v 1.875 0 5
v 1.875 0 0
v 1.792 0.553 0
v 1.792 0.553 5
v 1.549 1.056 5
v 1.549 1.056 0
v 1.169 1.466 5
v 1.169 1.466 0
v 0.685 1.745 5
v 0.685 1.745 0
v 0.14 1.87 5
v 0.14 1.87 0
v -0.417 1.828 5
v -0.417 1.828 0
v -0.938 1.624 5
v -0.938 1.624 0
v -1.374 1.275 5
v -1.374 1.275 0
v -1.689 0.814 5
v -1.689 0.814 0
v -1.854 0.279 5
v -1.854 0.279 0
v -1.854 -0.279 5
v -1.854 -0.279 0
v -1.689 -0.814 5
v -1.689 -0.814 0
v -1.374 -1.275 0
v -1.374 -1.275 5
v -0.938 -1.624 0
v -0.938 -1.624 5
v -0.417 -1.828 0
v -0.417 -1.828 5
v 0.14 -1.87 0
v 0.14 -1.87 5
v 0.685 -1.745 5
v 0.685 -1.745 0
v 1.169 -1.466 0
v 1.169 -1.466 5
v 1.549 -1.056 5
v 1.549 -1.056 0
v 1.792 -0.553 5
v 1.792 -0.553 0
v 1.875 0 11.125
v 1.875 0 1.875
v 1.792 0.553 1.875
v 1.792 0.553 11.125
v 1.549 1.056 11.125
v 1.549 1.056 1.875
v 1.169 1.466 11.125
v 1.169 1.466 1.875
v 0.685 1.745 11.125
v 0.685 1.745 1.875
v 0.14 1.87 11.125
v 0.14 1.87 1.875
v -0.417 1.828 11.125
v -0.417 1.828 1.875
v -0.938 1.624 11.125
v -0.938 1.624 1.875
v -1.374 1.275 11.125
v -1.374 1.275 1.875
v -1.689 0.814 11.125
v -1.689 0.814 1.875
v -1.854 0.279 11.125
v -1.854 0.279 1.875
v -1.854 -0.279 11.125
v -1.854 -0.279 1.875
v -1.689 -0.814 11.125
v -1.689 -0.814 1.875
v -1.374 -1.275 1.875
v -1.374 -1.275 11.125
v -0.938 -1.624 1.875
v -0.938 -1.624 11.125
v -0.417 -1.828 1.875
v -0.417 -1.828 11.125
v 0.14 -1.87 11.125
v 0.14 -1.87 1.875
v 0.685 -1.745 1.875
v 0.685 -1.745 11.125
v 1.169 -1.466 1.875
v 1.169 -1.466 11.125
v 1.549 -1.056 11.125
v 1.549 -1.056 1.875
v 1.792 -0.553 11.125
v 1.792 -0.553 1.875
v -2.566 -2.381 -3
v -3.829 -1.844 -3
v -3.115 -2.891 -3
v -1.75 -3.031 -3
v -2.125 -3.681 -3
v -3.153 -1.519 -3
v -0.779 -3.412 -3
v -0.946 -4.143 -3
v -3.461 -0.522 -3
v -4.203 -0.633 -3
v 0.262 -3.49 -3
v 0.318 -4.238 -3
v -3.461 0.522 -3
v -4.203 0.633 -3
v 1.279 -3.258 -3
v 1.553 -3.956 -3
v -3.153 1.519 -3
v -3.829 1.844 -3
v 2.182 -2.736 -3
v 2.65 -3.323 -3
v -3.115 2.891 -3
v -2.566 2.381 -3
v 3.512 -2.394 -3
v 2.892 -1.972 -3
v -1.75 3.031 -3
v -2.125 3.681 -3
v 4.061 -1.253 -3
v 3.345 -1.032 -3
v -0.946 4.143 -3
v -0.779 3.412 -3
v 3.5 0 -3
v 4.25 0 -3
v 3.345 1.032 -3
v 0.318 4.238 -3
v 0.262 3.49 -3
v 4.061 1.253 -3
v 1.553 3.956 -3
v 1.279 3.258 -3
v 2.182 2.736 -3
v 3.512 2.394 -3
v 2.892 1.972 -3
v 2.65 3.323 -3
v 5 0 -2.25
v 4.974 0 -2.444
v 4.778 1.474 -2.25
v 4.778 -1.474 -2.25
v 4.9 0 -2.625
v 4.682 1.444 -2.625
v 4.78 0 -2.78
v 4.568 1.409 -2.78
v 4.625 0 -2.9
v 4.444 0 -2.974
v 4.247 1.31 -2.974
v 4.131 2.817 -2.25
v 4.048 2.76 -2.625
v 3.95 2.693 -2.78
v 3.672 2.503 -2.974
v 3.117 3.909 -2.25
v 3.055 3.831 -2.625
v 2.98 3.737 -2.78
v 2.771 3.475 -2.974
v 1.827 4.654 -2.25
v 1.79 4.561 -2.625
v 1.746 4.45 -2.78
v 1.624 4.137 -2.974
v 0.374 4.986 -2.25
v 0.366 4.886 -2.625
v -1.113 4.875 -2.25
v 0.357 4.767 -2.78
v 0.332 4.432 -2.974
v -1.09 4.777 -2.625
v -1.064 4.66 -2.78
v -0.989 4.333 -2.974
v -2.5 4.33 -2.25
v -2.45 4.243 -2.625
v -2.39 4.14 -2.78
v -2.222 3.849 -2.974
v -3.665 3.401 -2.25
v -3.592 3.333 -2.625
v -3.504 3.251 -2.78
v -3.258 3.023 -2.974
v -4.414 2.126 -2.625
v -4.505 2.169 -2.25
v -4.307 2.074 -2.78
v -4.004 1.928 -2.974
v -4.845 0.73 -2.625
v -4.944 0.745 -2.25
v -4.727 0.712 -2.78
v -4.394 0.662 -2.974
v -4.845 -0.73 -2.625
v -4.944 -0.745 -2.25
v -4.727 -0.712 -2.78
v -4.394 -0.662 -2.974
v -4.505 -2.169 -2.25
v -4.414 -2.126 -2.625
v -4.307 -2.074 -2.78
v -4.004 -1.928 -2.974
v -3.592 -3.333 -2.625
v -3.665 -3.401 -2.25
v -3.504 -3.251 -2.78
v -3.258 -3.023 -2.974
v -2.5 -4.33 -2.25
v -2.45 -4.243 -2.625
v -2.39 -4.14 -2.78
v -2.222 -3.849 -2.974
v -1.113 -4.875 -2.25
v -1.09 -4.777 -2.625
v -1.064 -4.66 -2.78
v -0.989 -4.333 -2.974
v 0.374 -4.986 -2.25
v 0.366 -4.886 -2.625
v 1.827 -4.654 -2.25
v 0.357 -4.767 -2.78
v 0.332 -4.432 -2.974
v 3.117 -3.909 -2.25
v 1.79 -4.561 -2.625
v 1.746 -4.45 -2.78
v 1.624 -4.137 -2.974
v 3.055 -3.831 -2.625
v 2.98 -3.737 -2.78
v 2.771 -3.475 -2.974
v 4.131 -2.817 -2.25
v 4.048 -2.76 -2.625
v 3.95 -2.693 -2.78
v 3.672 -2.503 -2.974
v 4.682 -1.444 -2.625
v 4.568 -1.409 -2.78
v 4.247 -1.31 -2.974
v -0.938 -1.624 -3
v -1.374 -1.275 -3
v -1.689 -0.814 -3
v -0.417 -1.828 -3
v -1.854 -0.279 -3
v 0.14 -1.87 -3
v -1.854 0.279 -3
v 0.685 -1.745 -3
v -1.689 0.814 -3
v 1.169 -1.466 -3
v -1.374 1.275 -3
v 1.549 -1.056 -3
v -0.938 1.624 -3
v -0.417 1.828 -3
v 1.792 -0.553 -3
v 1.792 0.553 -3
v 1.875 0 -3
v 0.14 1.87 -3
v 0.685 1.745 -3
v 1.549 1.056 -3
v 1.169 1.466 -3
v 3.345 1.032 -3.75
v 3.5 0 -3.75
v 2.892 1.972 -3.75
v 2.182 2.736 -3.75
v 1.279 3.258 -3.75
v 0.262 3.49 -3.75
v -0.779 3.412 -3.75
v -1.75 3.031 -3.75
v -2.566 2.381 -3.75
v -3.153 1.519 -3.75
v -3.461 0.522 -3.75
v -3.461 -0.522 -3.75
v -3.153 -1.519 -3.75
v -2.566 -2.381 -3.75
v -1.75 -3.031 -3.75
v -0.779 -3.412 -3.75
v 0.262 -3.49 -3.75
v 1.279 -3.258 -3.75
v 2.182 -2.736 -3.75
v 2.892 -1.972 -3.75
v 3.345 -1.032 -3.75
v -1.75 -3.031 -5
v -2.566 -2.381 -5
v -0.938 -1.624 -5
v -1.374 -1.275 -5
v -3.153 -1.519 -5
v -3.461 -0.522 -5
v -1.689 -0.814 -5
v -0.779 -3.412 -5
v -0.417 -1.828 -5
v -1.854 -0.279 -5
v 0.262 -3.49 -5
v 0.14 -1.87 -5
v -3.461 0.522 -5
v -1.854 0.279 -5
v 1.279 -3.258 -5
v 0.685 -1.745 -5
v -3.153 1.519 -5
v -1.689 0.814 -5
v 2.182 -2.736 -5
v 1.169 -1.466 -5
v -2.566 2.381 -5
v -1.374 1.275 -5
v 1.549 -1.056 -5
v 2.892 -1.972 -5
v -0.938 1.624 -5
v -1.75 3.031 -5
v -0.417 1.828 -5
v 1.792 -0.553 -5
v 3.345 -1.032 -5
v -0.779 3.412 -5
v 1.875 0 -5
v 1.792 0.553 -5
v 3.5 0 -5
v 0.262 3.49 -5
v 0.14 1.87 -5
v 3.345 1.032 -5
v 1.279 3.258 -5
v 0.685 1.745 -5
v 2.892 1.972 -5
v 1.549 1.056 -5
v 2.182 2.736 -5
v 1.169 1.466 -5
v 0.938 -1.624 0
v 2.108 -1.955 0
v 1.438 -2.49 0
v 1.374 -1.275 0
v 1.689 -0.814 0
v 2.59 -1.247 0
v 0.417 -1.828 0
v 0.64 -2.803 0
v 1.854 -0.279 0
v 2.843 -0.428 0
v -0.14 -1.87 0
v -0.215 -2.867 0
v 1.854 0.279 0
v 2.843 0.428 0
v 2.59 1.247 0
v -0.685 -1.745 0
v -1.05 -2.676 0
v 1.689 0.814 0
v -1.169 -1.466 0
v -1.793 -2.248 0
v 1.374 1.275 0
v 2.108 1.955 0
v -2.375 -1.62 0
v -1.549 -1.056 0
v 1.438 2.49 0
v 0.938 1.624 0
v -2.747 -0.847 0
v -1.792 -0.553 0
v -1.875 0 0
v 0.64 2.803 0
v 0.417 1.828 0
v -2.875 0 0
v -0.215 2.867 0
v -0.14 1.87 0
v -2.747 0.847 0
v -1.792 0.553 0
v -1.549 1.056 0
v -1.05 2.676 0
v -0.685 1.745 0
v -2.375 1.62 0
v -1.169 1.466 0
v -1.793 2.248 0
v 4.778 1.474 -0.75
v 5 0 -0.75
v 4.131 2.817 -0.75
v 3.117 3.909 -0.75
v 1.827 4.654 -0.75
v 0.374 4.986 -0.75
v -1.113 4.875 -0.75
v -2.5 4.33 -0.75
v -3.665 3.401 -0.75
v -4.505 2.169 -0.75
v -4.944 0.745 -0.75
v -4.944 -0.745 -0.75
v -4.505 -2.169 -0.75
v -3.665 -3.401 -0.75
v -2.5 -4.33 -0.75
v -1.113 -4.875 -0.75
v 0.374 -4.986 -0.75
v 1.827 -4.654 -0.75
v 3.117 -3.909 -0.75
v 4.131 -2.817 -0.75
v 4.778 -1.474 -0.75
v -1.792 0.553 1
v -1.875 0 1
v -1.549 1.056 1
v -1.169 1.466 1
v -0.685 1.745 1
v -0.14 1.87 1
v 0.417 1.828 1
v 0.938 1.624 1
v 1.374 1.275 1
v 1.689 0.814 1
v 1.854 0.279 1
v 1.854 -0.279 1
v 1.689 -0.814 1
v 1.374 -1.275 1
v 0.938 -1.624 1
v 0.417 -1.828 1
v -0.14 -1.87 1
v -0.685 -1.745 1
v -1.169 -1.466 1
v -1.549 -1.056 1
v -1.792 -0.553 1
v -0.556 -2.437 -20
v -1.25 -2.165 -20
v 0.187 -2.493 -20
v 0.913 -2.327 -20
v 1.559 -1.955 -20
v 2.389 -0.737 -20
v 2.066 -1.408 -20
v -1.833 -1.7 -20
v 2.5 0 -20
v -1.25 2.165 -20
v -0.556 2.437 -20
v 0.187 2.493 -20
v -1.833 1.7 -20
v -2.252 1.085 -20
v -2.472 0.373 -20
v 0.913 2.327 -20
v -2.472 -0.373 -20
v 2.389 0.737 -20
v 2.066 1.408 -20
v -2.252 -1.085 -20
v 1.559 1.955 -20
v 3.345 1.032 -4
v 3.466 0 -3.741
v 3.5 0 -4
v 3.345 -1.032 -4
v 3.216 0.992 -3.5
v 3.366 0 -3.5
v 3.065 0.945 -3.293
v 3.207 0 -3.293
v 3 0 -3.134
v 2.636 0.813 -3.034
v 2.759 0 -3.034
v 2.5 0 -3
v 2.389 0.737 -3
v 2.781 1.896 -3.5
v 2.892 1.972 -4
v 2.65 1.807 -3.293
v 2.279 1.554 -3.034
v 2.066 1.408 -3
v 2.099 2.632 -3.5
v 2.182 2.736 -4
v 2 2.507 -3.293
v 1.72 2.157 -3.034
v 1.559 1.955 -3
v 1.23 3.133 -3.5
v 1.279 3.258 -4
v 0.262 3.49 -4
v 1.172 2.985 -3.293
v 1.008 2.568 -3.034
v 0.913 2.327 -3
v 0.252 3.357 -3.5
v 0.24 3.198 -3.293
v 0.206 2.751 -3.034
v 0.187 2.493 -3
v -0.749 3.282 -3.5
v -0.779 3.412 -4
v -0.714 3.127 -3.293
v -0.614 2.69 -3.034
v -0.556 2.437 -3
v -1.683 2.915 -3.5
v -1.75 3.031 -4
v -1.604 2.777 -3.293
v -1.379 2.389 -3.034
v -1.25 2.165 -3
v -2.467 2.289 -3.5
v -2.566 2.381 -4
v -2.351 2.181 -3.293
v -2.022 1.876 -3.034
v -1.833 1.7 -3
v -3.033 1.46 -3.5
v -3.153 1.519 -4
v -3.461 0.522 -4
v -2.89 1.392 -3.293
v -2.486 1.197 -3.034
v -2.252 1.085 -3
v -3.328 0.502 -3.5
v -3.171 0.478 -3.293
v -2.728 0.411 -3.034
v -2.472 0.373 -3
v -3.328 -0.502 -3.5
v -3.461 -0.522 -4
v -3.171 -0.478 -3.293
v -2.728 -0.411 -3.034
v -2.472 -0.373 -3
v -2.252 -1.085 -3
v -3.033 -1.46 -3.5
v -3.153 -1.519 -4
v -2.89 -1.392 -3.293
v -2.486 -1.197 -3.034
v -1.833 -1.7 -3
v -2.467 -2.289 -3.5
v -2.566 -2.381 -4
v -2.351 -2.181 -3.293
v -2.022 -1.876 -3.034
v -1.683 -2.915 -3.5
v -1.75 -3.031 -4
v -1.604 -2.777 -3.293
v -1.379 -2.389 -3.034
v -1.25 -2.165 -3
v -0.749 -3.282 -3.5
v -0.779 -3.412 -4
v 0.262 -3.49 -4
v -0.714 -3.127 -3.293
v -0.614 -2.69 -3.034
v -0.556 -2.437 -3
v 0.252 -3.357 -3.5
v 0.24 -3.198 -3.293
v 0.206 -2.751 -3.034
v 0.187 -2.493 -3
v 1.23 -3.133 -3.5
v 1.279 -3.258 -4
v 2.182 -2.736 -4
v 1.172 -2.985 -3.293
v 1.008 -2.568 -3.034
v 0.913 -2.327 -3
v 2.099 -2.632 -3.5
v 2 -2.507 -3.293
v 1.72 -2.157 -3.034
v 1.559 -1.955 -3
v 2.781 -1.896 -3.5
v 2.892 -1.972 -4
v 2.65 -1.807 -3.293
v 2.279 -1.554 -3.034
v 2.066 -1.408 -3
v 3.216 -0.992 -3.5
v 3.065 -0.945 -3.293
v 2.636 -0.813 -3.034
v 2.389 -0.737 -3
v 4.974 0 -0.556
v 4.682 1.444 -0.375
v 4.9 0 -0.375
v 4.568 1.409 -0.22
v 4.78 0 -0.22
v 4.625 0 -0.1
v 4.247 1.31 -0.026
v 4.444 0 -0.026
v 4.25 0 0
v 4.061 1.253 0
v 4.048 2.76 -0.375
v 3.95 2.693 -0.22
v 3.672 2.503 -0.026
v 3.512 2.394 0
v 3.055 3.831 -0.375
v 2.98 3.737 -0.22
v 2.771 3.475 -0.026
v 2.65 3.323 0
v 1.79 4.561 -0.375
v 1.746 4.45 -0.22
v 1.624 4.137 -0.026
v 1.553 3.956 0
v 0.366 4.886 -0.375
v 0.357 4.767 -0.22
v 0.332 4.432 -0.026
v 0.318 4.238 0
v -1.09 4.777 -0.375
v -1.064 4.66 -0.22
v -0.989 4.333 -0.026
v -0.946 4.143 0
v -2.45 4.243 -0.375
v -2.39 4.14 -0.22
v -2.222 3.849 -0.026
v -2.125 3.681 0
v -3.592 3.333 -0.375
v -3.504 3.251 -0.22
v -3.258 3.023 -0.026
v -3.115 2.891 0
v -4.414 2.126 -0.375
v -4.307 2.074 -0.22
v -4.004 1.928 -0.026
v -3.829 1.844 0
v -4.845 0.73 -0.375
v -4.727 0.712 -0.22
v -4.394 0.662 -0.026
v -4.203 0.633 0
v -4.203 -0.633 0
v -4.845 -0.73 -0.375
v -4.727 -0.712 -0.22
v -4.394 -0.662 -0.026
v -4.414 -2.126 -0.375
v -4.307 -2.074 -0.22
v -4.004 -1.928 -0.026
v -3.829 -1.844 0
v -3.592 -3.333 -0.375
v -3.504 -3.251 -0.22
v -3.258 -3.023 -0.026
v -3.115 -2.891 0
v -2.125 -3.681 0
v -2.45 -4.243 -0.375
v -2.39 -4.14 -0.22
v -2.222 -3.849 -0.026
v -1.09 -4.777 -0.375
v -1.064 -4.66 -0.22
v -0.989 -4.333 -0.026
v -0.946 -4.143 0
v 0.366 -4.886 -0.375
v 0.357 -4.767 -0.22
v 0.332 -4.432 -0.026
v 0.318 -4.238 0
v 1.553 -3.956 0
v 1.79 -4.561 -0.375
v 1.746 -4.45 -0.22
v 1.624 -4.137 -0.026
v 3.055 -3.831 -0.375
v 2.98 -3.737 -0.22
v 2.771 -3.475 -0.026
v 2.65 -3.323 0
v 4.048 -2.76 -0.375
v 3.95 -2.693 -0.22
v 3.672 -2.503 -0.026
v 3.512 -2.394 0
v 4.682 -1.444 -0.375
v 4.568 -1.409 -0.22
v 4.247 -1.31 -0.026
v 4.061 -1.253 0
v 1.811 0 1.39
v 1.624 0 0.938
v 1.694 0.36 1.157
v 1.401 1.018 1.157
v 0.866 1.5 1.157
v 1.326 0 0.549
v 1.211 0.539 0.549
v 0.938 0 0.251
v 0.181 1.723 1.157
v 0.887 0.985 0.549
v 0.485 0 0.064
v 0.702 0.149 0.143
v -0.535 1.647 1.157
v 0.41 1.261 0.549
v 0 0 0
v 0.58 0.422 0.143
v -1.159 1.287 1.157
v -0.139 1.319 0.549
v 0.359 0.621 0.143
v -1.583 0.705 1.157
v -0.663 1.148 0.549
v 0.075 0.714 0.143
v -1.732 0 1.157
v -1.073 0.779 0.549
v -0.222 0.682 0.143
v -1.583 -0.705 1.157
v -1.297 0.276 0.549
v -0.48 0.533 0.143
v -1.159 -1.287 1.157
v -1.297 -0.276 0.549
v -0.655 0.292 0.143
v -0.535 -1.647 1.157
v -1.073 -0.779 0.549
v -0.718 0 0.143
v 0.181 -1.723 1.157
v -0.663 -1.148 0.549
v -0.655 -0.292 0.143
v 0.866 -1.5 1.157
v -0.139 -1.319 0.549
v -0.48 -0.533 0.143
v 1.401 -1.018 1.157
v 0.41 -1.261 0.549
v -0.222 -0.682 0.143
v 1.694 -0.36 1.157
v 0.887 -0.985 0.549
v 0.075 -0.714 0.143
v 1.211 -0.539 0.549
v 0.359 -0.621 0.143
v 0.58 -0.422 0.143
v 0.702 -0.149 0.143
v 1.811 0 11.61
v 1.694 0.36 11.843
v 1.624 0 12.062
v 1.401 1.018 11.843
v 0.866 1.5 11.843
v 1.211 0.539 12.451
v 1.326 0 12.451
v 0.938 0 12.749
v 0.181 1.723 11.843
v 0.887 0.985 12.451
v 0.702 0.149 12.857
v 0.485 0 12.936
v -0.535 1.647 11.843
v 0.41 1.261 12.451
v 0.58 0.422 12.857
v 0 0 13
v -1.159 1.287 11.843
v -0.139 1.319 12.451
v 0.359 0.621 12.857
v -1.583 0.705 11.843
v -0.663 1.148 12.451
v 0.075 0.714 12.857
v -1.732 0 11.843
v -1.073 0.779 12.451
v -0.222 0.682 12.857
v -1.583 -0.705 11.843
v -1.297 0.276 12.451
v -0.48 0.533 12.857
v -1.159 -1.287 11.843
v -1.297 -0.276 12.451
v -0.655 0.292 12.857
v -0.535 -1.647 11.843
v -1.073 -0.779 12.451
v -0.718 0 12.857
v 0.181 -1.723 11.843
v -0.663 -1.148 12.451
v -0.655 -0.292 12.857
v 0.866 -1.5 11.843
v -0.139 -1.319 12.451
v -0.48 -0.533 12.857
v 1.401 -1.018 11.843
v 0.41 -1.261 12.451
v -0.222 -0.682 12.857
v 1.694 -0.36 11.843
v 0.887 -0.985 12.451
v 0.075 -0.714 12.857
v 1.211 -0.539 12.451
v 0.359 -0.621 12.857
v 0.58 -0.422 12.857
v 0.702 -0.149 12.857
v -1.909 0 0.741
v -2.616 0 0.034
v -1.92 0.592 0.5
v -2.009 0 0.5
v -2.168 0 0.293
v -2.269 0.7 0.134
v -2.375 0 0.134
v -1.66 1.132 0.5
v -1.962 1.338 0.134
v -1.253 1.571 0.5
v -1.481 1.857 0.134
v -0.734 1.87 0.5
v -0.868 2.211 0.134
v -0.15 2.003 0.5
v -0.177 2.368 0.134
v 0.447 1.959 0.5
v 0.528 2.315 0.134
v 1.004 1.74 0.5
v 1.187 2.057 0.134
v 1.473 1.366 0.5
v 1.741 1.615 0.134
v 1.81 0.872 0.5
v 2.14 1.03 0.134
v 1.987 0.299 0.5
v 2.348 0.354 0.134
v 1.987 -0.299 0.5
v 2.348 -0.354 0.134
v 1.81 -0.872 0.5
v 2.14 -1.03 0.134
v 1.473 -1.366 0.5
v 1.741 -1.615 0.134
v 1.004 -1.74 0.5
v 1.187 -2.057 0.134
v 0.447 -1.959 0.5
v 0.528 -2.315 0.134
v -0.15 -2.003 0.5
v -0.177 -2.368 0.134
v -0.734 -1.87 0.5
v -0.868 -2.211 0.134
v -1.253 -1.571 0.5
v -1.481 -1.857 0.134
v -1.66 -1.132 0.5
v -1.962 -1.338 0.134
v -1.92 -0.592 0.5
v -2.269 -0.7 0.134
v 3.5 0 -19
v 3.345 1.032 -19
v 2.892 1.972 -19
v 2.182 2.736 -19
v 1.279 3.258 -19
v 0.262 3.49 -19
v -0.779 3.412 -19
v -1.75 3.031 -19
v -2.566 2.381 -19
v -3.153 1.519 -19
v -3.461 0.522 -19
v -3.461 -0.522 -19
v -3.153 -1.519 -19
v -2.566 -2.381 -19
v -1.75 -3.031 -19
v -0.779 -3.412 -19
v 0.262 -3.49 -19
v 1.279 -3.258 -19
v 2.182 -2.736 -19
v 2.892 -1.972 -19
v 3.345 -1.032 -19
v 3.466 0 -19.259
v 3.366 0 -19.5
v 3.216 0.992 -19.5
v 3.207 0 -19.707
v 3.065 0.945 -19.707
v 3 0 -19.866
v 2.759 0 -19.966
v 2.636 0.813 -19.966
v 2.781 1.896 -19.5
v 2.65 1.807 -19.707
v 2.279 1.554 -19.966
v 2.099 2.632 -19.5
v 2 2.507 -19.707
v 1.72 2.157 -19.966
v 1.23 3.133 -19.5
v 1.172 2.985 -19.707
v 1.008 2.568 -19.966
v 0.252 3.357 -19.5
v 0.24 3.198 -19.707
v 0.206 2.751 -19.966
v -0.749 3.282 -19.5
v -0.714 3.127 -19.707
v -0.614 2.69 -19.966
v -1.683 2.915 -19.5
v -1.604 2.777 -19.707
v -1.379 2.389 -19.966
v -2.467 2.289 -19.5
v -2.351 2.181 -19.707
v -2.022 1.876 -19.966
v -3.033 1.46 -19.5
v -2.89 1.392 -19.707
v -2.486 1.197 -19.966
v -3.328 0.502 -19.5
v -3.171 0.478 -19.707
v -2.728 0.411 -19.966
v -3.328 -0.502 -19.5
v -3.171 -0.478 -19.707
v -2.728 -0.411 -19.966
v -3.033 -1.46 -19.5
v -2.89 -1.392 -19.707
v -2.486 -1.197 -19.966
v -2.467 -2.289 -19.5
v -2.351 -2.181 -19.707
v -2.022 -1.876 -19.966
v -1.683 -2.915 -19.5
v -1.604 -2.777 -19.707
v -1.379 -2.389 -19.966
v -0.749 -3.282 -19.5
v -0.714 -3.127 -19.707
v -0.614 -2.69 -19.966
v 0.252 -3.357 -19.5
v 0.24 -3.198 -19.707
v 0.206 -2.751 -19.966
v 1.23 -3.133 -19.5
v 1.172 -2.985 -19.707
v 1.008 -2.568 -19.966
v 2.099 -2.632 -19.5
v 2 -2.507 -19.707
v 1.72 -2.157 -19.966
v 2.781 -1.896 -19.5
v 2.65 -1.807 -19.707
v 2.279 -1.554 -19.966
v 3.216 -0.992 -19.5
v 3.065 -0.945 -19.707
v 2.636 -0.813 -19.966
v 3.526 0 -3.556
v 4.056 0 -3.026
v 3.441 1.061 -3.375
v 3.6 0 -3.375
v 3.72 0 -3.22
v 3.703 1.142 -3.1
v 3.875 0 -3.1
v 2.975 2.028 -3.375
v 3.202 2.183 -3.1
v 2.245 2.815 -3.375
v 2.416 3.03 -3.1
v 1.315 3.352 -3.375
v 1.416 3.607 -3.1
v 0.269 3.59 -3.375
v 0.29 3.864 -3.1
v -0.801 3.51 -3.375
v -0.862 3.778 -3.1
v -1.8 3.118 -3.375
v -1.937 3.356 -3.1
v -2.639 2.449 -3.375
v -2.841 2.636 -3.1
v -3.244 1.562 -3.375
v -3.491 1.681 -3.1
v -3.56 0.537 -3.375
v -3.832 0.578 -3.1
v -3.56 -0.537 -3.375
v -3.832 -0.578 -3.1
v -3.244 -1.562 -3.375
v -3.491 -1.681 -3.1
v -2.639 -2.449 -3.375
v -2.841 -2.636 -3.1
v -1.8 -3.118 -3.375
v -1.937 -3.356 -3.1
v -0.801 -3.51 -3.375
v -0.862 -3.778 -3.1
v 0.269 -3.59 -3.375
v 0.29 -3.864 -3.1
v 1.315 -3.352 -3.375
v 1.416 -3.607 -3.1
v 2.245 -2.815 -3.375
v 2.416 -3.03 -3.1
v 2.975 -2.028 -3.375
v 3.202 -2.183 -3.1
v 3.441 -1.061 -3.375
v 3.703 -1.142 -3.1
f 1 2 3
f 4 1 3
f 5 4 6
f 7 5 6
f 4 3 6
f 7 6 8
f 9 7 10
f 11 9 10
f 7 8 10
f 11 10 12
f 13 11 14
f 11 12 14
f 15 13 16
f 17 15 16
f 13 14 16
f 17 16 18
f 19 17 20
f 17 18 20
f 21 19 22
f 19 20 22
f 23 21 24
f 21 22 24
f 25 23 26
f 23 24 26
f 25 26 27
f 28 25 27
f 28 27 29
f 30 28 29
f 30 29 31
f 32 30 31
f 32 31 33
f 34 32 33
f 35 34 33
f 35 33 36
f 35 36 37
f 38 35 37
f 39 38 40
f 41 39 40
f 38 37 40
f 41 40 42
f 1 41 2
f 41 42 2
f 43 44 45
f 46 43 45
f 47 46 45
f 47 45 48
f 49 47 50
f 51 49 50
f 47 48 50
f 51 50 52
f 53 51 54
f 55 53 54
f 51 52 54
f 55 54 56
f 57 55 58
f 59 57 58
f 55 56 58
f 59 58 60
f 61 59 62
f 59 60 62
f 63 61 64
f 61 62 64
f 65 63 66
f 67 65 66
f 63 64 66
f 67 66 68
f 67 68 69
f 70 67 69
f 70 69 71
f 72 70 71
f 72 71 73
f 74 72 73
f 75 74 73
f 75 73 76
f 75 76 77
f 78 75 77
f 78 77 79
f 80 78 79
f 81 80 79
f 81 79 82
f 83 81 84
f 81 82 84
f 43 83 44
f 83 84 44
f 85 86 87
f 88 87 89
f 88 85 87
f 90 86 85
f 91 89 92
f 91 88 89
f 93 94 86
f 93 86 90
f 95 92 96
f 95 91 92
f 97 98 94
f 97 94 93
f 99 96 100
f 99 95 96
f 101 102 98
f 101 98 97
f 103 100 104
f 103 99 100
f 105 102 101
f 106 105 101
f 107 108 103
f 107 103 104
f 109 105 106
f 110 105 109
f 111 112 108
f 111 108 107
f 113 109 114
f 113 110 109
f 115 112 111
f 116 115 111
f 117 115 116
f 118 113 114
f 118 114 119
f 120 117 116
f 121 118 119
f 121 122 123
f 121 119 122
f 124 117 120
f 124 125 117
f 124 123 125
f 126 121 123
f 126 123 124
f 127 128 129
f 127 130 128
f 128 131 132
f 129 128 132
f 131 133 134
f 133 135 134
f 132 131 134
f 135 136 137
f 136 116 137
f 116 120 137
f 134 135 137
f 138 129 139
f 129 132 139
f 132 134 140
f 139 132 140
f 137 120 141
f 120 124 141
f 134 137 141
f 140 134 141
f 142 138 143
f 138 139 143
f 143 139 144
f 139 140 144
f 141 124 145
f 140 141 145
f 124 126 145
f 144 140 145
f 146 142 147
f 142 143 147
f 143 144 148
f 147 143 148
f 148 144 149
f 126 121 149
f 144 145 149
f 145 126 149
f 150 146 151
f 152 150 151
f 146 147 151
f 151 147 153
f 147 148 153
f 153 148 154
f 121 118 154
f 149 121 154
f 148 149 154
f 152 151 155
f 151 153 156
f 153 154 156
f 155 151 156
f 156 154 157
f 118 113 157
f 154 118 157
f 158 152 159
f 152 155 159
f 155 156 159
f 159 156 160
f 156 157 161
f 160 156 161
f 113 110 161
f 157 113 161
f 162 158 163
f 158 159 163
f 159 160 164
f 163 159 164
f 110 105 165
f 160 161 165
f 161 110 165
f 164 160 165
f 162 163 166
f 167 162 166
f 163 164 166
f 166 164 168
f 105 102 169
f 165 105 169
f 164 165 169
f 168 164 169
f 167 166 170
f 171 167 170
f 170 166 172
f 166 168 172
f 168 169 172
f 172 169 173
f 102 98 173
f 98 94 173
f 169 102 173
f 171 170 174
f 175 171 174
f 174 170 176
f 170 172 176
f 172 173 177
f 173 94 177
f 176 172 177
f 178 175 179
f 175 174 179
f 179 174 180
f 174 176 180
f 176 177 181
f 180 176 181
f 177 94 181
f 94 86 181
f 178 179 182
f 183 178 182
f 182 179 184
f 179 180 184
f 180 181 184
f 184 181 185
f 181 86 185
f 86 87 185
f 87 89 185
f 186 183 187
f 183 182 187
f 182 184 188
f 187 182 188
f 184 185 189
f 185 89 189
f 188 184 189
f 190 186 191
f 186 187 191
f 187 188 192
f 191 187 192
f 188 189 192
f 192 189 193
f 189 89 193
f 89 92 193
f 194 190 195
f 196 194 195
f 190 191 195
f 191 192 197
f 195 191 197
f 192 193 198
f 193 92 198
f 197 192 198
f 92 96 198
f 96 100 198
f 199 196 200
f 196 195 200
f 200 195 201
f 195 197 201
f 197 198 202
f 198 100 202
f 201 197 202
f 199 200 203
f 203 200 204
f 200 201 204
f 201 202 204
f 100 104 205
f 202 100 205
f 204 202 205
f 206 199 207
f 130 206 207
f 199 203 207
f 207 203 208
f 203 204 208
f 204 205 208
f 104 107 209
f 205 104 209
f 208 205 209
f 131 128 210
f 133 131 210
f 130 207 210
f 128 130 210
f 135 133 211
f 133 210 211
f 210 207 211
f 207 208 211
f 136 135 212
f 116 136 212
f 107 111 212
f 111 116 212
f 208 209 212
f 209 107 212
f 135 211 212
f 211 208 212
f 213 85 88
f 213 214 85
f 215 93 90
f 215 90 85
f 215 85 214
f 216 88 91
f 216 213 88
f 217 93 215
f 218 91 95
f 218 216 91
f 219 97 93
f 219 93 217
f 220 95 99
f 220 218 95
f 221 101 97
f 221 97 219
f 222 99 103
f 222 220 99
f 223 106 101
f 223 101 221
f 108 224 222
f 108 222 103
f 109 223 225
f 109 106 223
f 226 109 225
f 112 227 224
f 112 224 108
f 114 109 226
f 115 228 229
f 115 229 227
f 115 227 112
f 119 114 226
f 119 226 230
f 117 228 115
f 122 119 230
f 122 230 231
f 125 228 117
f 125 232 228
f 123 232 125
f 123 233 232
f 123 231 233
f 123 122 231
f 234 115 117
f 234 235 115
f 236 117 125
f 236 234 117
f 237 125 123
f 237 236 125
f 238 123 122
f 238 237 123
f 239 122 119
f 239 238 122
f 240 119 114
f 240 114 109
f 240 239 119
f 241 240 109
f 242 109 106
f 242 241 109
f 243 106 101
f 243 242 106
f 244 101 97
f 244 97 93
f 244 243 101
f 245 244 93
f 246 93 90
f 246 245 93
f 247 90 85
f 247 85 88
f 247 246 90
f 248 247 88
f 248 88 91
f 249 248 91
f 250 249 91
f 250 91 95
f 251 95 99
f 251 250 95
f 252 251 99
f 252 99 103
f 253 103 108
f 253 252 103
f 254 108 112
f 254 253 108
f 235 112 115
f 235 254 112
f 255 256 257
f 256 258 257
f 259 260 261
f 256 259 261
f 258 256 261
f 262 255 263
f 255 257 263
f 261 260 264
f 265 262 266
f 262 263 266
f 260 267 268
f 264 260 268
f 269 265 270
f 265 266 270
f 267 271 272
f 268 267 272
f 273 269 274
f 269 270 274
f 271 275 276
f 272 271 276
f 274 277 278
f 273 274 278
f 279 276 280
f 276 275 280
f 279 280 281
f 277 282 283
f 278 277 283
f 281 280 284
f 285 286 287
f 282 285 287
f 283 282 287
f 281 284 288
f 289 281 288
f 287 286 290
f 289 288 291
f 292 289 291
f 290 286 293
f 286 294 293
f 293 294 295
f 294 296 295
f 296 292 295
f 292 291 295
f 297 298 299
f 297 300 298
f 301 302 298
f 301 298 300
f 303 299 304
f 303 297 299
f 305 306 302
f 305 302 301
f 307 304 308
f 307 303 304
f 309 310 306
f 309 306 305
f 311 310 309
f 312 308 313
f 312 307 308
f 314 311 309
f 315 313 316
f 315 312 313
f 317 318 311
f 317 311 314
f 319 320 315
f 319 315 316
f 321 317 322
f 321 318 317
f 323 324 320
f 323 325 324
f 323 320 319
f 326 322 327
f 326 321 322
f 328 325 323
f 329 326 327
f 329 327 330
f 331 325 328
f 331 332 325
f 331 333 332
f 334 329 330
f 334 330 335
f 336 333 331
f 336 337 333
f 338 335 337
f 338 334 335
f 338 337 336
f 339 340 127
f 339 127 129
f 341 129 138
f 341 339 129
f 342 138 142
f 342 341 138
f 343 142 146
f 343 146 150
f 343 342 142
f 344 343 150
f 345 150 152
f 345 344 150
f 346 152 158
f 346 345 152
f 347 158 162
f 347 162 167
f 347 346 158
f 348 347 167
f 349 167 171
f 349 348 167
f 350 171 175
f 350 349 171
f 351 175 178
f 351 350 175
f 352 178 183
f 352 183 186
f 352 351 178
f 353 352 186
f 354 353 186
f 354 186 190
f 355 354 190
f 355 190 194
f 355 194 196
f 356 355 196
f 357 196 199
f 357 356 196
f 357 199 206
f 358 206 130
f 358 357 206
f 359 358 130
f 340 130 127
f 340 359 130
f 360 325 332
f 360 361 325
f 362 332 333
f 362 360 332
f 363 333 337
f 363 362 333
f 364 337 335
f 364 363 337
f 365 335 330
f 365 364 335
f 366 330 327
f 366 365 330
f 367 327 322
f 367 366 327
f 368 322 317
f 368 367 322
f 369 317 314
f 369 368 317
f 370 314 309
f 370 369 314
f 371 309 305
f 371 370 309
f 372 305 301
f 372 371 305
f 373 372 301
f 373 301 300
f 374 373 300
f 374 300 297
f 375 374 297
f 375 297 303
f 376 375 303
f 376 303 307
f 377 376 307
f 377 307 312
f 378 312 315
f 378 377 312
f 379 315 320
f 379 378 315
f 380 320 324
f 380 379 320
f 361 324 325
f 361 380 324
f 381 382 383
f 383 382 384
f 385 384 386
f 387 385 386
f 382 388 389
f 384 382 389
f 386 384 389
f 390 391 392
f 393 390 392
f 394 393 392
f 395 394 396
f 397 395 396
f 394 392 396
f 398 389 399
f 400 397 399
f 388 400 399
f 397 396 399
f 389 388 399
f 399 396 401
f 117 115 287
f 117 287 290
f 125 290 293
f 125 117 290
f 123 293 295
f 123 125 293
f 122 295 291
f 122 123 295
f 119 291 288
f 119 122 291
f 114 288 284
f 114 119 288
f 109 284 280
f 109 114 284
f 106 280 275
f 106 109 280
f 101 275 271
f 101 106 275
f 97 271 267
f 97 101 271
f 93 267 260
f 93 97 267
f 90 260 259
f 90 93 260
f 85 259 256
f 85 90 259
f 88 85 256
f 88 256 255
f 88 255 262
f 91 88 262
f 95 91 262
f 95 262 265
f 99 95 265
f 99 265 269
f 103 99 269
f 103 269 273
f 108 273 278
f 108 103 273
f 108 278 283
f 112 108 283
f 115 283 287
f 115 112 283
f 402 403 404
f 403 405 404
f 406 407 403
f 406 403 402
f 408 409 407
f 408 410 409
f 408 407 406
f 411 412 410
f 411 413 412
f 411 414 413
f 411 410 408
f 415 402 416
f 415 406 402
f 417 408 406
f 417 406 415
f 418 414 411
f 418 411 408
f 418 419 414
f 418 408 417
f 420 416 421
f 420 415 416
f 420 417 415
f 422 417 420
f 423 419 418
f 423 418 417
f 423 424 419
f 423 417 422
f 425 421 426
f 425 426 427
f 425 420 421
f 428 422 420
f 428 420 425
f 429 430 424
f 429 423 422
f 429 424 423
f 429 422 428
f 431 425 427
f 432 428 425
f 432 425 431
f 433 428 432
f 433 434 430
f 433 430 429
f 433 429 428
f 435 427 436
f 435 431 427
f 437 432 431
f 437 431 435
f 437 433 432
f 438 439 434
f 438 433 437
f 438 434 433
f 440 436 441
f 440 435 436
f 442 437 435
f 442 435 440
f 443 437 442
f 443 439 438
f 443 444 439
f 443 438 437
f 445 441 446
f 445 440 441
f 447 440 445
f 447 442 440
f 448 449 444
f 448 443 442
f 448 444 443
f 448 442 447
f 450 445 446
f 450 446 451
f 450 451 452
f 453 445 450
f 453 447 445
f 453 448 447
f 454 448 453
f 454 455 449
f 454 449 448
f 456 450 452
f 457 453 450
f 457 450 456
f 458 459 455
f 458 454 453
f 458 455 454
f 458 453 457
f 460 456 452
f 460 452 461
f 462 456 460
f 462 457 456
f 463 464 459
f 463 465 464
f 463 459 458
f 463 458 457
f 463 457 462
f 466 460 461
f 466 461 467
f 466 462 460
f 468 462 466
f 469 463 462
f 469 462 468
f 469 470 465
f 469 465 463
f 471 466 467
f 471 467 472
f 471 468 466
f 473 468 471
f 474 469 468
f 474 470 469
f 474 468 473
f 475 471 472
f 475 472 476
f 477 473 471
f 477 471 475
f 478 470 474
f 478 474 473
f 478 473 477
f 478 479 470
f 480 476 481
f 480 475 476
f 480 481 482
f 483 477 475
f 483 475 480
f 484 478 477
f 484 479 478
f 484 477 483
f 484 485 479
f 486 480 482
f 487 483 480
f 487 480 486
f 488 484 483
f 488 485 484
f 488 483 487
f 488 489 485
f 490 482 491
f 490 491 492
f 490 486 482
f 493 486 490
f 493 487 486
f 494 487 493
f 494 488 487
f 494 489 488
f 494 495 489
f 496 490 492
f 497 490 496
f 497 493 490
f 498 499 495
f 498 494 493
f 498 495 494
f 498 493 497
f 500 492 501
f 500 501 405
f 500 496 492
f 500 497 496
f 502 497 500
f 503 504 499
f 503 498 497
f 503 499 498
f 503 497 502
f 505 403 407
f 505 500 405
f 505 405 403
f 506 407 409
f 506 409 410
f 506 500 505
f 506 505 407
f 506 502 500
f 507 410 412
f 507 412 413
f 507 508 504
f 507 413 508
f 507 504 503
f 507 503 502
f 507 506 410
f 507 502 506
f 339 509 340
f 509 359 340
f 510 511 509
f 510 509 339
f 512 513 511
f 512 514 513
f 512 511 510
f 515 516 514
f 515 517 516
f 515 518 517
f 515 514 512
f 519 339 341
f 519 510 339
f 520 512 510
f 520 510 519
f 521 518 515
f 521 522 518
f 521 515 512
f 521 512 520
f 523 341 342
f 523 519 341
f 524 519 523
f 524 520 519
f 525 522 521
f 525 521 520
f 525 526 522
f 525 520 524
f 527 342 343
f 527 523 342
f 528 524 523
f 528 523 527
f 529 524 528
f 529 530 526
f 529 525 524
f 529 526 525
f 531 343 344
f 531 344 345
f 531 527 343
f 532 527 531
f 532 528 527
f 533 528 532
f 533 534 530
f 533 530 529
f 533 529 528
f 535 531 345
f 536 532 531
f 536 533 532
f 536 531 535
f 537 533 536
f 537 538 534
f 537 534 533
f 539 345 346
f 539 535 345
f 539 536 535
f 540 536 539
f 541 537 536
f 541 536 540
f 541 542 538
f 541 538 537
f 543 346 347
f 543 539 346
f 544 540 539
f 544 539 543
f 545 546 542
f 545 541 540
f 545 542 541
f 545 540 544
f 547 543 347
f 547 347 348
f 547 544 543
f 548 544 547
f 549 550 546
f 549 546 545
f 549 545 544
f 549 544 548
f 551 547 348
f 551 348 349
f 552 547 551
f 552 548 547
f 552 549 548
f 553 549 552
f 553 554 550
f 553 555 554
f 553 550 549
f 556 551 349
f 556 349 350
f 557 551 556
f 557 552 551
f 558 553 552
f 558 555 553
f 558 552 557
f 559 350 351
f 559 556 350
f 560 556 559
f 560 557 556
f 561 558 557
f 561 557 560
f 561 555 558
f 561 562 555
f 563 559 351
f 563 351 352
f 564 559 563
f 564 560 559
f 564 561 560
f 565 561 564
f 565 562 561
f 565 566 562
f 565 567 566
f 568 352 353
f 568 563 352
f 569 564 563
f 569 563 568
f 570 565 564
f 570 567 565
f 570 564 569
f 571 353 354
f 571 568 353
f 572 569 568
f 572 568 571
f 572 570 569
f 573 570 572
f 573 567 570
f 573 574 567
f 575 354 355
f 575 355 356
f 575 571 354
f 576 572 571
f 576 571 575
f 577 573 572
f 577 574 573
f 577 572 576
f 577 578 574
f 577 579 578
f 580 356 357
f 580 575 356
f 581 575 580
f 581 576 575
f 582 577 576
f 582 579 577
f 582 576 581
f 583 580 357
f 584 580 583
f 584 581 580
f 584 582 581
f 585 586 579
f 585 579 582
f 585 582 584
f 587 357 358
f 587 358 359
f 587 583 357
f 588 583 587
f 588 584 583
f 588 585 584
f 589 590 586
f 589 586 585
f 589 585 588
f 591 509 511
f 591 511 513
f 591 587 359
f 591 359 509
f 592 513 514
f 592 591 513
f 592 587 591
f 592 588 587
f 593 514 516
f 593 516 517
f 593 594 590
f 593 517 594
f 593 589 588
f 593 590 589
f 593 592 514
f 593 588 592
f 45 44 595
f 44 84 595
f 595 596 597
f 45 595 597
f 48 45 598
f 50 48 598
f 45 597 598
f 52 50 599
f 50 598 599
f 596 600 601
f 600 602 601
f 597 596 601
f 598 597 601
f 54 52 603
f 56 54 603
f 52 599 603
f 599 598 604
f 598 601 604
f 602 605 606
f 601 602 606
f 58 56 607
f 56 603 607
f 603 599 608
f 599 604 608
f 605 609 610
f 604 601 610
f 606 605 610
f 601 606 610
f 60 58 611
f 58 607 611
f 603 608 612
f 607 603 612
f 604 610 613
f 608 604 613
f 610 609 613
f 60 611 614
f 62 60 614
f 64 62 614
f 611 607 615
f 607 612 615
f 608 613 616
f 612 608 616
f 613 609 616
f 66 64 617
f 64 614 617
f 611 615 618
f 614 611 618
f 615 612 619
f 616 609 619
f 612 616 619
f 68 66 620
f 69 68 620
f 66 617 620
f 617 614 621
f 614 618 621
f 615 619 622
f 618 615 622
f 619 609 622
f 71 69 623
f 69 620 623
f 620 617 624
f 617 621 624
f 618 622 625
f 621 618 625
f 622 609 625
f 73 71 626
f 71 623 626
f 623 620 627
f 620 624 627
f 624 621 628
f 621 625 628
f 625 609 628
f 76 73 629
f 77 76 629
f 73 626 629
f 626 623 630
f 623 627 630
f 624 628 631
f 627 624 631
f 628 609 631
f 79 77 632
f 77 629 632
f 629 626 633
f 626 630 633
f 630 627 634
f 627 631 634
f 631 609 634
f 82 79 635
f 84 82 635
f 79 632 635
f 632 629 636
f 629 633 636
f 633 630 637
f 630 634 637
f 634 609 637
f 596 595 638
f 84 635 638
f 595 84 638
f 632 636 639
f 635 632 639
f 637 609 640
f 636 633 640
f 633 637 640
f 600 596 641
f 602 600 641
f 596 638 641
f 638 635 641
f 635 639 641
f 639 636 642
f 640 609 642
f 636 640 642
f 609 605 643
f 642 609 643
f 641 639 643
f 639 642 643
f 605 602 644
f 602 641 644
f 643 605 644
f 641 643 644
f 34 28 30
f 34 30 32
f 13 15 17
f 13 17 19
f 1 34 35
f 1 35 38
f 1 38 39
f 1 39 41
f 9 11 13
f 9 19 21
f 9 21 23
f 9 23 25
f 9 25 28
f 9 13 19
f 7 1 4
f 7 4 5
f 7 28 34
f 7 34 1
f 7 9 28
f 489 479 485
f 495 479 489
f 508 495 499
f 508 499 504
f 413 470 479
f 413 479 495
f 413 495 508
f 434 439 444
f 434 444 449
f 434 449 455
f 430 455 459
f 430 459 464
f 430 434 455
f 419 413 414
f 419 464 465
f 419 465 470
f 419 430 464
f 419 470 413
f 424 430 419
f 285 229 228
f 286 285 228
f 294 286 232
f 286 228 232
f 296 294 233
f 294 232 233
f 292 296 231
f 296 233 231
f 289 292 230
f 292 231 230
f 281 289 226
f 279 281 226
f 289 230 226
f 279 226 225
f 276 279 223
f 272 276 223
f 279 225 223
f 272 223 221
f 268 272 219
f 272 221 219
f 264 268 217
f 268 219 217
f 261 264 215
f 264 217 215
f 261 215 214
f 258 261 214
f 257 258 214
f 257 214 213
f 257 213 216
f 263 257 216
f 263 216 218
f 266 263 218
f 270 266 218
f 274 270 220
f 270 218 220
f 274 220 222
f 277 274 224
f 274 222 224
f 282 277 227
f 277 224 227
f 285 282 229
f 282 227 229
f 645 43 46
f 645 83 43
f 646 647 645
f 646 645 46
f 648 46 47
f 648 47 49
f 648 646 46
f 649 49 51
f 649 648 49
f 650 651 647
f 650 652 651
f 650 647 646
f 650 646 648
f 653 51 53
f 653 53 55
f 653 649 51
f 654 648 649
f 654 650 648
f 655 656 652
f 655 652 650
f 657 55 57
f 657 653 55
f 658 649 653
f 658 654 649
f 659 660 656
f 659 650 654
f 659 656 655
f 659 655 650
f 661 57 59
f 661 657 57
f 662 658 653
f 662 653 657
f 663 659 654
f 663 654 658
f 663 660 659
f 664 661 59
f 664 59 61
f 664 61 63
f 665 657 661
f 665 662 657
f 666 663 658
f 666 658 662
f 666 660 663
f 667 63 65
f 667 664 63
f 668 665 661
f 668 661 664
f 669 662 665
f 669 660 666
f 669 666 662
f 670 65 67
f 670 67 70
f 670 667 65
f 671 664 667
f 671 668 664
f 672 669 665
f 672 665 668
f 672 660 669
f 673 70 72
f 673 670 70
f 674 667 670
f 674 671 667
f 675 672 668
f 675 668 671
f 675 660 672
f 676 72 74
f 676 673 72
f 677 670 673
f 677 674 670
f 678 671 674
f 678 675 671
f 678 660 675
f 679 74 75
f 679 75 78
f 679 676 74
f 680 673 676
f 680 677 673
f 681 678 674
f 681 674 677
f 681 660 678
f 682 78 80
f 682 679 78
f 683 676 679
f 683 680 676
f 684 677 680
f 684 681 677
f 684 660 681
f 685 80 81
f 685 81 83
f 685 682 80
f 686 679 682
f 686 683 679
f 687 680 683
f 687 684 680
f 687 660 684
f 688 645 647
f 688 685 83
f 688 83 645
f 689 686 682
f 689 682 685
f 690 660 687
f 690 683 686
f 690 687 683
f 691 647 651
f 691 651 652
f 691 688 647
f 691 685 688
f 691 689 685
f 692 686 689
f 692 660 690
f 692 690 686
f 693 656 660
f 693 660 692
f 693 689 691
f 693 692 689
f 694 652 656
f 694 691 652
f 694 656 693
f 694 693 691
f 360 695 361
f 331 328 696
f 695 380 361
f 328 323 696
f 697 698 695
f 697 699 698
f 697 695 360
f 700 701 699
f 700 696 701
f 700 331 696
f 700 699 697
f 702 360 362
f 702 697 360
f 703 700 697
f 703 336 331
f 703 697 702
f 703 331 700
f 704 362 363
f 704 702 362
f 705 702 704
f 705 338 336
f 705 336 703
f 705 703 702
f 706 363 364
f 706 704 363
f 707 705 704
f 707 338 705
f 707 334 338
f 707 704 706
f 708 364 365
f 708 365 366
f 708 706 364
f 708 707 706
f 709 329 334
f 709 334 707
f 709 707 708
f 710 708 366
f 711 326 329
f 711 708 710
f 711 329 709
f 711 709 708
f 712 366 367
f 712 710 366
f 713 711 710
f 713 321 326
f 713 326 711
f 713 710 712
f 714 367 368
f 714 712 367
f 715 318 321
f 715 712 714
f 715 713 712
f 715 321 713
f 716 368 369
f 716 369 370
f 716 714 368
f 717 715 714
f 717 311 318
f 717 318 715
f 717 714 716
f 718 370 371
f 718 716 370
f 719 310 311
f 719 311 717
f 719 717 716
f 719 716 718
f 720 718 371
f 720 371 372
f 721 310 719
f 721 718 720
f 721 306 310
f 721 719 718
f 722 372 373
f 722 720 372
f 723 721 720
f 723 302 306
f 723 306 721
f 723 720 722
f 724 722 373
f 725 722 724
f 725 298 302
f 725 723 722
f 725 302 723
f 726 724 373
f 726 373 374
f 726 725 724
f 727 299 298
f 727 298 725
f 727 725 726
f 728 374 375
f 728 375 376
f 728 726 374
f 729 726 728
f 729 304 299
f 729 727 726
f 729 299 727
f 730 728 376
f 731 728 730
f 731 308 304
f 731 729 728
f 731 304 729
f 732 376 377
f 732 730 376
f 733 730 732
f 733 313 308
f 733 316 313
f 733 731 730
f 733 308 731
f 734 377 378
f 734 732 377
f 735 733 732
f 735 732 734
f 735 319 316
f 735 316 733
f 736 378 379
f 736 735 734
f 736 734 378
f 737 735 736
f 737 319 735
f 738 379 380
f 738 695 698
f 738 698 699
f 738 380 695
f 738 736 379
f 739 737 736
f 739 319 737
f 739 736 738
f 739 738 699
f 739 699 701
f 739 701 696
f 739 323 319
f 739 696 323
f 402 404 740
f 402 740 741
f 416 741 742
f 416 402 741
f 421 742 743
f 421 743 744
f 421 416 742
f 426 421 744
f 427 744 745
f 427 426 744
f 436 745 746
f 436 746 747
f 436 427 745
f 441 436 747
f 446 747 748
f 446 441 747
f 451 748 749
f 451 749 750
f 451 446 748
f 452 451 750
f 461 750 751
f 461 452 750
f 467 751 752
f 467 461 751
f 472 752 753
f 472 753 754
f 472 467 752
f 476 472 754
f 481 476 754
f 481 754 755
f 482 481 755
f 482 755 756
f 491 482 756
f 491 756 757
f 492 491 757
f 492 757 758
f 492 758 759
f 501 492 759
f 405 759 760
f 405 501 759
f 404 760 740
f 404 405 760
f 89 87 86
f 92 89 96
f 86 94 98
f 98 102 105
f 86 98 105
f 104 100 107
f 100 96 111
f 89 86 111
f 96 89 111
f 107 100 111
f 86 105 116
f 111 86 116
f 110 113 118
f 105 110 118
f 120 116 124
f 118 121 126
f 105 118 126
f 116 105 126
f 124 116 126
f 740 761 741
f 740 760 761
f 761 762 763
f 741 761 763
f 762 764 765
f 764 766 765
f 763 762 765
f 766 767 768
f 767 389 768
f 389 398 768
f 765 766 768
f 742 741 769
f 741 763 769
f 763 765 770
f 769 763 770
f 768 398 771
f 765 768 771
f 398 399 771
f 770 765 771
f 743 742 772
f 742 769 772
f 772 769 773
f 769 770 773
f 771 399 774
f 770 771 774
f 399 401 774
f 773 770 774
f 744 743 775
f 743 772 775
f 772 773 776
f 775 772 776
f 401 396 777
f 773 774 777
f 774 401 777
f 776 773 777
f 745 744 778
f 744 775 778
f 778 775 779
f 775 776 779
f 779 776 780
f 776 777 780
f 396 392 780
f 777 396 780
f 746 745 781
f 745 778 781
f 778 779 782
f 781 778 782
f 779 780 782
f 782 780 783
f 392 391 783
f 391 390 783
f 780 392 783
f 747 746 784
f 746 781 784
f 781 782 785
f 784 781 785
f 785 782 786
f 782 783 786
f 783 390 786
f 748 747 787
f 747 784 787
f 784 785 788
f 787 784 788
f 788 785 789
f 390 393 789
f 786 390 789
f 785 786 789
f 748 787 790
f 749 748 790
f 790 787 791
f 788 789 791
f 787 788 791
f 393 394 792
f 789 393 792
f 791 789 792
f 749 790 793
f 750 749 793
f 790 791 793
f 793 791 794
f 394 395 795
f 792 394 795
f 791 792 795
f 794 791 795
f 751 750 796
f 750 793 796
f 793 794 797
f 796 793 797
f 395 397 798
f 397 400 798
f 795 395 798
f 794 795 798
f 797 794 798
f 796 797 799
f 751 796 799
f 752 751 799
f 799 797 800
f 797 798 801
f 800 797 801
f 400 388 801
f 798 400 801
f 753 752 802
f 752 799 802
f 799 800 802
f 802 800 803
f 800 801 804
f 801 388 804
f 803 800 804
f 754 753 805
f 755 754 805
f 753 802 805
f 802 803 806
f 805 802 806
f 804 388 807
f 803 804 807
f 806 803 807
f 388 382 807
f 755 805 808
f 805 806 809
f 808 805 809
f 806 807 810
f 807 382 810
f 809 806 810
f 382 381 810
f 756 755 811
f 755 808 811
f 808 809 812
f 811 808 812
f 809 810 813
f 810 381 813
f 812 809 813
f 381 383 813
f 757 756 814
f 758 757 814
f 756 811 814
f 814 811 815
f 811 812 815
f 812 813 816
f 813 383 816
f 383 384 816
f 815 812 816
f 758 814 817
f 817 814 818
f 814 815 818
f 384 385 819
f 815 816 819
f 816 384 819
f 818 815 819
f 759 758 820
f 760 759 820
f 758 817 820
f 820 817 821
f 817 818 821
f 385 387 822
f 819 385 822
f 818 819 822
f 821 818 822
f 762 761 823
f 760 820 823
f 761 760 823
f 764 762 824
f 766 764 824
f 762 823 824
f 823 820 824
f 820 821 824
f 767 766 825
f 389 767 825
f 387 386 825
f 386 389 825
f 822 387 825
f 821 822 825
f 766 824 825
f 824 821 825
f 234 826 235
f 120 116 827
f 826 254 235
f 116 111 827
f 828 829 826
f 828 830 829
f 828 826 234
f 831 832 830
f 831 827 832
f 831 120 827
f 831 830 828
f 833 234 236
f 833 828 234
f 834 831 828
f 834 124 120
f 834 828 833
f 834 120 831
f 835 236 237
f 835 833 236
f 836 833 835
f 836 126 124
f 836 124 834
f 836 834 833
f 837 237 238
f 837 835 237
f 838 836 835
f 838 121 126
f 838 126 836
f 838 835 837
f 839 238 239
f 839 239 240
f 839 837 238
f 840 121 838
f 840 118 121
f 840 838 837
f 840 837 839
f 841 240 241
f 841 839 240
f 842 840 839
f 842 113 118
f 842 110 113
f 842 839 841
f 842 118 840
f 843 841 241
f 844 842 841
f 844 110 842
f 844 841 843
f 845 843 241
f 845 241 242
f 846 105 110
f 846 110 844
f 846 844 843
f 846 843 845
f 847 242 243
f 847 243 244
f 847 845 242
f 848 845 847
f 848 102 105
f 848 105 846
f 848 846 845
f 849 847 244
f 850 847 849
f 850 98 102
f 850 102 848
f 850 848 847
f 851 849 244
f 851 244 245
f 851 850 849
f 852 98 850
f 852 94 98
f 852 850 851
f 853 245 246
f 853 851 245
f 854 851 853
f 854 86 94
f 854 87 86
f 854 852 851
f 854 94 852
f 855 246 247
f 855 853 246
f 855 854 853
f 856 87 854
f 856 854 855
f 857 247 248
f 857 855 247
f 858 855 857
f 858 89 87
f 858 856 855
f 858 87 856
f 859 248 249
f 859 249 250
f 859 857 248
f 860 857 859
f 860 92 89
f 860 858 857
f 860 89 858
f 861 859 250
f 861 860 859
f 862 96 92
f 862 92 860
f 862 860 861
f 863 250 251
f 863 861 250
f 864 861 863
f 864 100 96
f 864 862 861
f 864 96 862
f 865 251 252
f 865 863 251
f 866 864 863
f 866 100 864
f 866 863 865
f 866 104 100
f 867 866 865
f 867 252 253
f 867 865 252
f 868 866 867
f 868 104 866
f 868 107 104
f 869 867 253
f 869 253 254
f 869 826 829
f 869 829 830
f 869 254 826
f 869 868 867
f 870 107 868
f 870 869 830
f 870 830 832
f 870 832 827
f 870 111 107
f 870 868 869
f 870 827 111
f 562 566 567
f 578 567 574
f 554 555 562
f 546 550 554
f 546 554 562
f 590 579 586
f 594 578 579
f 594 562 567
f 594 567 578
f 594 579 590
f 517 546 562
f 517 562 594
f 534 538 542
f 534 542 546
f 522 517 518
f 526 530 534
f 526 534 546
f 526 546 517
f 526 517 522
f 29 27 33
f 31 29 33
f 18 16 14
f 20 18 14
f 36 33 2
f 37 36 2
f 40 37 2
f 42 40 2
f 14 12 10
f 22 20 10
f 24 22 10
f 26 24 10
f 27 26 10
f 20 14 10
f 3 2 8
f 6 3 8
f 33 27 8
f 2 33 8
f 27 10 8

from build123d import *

# Parameters (mm, degrees)
F0_R      = 1.875
F1_DEPTH  = 13
F2_START  = -3
F0_R_2    = 3.5
F2_DEPTH  = 17
F0_R_3    = 5
F3_DEPTH  = 3
F4_R      = 1.875
F5_DEPTH  = 5
F8_R      = 0.75
F9_R      = 1
F10_START = -3
F10_DEPTH = 2


with BuildPart() as f1:
    # F0 (on Top) → F1 (new body)
    with BuildSketch(Plane.XY):
        Circle(F0_R)
    extrude(amount=F1_DEPTH)

    # F4
    f4_edges = [f1.edges().sort_by_distance(p)[0] for p in [
        (1.875, 0, 6.5),
        (-1.875, 0, 0),
        (-1.875, 0, 13),
    ]]
    fillet(f4_edges, radius=F4_R)


with BuildPart() as f2:
    # F0 (on Top) → F2 (new body)
    with BuildSketch(Plane.XY.offset(F2_START)):
        Circle(F0_R_2)
        Circle(F0_R, mode=Mode.SUBTRACT)
        Circle(F0_R)
    extrude(amount=-F2_DEPTH)

    # F9
    f9_edges = [f2.edges().sort_by_distance(p)[0] for p in [
        (3.5, 0, -11.5),
        (-3.5, 0, -3),
        (-3.5, 0, -20),
    ]]
    fillet(f9_edges, radius=F9_R)


with BuildPart() as f3:
    # F0 (on Top) → F3 (new body)
    with BuildSketch(Plane.XY):
        Circle(F0_R_3)
        Circle(F0_R_2, mode=Mode.SUBTRACT)
        Circle(F0_R_2)
        Circle(F0_R, mode=Mode.SUBTRACT)
        Circle(F0_R)
    extrude(amount=-F3_DEPTH)

    # F8
    f8_edges = [f3.edges().sort_by_distance(p)[0] for p in [
        (5, 0, -1.5),
        (-5, 0, 0),
        (-5, 0, -3),
    ]]
    fillet(f8_edges, radius=F8_R)


with BuildPart() as f5:
    # F0 (on Top) → F5 (new body)
    with BuildSketch(Plane.XY):
        Circle(F0_R)
    extrude(amount=F5_DEPTH)


with BuildPart() as f7:
    # F6 (on Front) → F7 (revolve)
    with BuildSketch(Plane.XZ):
        with BuildLine():
            Line((-1.875, 0), (-1.875, 1))
            ThreePointArc((-1.875, 1), (-2.1678932188, 0.2928932188), (-2.875, 0))
            Line((-2.875, 0), (-1.875, 0))
        make_face()
    revolve(axis=Axis((0, 0, 0), (0, 0, -1)))


with BuildPart() as f10:
    # F0 (on Top) → F10 (new body)
    with BuildSketch(Plane.XY.offset(F10_START)):
        Circle(F0_R_2)
        Circle(F0_R, mode=Mode.SUBTRACT)
    extrude(amount=-F10_DEPTH)


with BuildPart() as f12:
    # F11 (on Front) → F12 (revolve)
    with BuildSketch(Plane.XZ):
        with BuildLine():
            ThreePointArc((3.5, -3.75), (3.7196699141, -3.2196699141), (4.25, -3))
            Line((4.25, -3), (3.5, -3))
            Line((3.5, -3), (3.5, -3.75))
        make_face()
    revolve(axis=Axis((0, 0, -3), (0, 0, 1)))


solid = Compound([f1.part, f2.part, f3.part, f5.part, f7.part, f10.part, f12.part])
